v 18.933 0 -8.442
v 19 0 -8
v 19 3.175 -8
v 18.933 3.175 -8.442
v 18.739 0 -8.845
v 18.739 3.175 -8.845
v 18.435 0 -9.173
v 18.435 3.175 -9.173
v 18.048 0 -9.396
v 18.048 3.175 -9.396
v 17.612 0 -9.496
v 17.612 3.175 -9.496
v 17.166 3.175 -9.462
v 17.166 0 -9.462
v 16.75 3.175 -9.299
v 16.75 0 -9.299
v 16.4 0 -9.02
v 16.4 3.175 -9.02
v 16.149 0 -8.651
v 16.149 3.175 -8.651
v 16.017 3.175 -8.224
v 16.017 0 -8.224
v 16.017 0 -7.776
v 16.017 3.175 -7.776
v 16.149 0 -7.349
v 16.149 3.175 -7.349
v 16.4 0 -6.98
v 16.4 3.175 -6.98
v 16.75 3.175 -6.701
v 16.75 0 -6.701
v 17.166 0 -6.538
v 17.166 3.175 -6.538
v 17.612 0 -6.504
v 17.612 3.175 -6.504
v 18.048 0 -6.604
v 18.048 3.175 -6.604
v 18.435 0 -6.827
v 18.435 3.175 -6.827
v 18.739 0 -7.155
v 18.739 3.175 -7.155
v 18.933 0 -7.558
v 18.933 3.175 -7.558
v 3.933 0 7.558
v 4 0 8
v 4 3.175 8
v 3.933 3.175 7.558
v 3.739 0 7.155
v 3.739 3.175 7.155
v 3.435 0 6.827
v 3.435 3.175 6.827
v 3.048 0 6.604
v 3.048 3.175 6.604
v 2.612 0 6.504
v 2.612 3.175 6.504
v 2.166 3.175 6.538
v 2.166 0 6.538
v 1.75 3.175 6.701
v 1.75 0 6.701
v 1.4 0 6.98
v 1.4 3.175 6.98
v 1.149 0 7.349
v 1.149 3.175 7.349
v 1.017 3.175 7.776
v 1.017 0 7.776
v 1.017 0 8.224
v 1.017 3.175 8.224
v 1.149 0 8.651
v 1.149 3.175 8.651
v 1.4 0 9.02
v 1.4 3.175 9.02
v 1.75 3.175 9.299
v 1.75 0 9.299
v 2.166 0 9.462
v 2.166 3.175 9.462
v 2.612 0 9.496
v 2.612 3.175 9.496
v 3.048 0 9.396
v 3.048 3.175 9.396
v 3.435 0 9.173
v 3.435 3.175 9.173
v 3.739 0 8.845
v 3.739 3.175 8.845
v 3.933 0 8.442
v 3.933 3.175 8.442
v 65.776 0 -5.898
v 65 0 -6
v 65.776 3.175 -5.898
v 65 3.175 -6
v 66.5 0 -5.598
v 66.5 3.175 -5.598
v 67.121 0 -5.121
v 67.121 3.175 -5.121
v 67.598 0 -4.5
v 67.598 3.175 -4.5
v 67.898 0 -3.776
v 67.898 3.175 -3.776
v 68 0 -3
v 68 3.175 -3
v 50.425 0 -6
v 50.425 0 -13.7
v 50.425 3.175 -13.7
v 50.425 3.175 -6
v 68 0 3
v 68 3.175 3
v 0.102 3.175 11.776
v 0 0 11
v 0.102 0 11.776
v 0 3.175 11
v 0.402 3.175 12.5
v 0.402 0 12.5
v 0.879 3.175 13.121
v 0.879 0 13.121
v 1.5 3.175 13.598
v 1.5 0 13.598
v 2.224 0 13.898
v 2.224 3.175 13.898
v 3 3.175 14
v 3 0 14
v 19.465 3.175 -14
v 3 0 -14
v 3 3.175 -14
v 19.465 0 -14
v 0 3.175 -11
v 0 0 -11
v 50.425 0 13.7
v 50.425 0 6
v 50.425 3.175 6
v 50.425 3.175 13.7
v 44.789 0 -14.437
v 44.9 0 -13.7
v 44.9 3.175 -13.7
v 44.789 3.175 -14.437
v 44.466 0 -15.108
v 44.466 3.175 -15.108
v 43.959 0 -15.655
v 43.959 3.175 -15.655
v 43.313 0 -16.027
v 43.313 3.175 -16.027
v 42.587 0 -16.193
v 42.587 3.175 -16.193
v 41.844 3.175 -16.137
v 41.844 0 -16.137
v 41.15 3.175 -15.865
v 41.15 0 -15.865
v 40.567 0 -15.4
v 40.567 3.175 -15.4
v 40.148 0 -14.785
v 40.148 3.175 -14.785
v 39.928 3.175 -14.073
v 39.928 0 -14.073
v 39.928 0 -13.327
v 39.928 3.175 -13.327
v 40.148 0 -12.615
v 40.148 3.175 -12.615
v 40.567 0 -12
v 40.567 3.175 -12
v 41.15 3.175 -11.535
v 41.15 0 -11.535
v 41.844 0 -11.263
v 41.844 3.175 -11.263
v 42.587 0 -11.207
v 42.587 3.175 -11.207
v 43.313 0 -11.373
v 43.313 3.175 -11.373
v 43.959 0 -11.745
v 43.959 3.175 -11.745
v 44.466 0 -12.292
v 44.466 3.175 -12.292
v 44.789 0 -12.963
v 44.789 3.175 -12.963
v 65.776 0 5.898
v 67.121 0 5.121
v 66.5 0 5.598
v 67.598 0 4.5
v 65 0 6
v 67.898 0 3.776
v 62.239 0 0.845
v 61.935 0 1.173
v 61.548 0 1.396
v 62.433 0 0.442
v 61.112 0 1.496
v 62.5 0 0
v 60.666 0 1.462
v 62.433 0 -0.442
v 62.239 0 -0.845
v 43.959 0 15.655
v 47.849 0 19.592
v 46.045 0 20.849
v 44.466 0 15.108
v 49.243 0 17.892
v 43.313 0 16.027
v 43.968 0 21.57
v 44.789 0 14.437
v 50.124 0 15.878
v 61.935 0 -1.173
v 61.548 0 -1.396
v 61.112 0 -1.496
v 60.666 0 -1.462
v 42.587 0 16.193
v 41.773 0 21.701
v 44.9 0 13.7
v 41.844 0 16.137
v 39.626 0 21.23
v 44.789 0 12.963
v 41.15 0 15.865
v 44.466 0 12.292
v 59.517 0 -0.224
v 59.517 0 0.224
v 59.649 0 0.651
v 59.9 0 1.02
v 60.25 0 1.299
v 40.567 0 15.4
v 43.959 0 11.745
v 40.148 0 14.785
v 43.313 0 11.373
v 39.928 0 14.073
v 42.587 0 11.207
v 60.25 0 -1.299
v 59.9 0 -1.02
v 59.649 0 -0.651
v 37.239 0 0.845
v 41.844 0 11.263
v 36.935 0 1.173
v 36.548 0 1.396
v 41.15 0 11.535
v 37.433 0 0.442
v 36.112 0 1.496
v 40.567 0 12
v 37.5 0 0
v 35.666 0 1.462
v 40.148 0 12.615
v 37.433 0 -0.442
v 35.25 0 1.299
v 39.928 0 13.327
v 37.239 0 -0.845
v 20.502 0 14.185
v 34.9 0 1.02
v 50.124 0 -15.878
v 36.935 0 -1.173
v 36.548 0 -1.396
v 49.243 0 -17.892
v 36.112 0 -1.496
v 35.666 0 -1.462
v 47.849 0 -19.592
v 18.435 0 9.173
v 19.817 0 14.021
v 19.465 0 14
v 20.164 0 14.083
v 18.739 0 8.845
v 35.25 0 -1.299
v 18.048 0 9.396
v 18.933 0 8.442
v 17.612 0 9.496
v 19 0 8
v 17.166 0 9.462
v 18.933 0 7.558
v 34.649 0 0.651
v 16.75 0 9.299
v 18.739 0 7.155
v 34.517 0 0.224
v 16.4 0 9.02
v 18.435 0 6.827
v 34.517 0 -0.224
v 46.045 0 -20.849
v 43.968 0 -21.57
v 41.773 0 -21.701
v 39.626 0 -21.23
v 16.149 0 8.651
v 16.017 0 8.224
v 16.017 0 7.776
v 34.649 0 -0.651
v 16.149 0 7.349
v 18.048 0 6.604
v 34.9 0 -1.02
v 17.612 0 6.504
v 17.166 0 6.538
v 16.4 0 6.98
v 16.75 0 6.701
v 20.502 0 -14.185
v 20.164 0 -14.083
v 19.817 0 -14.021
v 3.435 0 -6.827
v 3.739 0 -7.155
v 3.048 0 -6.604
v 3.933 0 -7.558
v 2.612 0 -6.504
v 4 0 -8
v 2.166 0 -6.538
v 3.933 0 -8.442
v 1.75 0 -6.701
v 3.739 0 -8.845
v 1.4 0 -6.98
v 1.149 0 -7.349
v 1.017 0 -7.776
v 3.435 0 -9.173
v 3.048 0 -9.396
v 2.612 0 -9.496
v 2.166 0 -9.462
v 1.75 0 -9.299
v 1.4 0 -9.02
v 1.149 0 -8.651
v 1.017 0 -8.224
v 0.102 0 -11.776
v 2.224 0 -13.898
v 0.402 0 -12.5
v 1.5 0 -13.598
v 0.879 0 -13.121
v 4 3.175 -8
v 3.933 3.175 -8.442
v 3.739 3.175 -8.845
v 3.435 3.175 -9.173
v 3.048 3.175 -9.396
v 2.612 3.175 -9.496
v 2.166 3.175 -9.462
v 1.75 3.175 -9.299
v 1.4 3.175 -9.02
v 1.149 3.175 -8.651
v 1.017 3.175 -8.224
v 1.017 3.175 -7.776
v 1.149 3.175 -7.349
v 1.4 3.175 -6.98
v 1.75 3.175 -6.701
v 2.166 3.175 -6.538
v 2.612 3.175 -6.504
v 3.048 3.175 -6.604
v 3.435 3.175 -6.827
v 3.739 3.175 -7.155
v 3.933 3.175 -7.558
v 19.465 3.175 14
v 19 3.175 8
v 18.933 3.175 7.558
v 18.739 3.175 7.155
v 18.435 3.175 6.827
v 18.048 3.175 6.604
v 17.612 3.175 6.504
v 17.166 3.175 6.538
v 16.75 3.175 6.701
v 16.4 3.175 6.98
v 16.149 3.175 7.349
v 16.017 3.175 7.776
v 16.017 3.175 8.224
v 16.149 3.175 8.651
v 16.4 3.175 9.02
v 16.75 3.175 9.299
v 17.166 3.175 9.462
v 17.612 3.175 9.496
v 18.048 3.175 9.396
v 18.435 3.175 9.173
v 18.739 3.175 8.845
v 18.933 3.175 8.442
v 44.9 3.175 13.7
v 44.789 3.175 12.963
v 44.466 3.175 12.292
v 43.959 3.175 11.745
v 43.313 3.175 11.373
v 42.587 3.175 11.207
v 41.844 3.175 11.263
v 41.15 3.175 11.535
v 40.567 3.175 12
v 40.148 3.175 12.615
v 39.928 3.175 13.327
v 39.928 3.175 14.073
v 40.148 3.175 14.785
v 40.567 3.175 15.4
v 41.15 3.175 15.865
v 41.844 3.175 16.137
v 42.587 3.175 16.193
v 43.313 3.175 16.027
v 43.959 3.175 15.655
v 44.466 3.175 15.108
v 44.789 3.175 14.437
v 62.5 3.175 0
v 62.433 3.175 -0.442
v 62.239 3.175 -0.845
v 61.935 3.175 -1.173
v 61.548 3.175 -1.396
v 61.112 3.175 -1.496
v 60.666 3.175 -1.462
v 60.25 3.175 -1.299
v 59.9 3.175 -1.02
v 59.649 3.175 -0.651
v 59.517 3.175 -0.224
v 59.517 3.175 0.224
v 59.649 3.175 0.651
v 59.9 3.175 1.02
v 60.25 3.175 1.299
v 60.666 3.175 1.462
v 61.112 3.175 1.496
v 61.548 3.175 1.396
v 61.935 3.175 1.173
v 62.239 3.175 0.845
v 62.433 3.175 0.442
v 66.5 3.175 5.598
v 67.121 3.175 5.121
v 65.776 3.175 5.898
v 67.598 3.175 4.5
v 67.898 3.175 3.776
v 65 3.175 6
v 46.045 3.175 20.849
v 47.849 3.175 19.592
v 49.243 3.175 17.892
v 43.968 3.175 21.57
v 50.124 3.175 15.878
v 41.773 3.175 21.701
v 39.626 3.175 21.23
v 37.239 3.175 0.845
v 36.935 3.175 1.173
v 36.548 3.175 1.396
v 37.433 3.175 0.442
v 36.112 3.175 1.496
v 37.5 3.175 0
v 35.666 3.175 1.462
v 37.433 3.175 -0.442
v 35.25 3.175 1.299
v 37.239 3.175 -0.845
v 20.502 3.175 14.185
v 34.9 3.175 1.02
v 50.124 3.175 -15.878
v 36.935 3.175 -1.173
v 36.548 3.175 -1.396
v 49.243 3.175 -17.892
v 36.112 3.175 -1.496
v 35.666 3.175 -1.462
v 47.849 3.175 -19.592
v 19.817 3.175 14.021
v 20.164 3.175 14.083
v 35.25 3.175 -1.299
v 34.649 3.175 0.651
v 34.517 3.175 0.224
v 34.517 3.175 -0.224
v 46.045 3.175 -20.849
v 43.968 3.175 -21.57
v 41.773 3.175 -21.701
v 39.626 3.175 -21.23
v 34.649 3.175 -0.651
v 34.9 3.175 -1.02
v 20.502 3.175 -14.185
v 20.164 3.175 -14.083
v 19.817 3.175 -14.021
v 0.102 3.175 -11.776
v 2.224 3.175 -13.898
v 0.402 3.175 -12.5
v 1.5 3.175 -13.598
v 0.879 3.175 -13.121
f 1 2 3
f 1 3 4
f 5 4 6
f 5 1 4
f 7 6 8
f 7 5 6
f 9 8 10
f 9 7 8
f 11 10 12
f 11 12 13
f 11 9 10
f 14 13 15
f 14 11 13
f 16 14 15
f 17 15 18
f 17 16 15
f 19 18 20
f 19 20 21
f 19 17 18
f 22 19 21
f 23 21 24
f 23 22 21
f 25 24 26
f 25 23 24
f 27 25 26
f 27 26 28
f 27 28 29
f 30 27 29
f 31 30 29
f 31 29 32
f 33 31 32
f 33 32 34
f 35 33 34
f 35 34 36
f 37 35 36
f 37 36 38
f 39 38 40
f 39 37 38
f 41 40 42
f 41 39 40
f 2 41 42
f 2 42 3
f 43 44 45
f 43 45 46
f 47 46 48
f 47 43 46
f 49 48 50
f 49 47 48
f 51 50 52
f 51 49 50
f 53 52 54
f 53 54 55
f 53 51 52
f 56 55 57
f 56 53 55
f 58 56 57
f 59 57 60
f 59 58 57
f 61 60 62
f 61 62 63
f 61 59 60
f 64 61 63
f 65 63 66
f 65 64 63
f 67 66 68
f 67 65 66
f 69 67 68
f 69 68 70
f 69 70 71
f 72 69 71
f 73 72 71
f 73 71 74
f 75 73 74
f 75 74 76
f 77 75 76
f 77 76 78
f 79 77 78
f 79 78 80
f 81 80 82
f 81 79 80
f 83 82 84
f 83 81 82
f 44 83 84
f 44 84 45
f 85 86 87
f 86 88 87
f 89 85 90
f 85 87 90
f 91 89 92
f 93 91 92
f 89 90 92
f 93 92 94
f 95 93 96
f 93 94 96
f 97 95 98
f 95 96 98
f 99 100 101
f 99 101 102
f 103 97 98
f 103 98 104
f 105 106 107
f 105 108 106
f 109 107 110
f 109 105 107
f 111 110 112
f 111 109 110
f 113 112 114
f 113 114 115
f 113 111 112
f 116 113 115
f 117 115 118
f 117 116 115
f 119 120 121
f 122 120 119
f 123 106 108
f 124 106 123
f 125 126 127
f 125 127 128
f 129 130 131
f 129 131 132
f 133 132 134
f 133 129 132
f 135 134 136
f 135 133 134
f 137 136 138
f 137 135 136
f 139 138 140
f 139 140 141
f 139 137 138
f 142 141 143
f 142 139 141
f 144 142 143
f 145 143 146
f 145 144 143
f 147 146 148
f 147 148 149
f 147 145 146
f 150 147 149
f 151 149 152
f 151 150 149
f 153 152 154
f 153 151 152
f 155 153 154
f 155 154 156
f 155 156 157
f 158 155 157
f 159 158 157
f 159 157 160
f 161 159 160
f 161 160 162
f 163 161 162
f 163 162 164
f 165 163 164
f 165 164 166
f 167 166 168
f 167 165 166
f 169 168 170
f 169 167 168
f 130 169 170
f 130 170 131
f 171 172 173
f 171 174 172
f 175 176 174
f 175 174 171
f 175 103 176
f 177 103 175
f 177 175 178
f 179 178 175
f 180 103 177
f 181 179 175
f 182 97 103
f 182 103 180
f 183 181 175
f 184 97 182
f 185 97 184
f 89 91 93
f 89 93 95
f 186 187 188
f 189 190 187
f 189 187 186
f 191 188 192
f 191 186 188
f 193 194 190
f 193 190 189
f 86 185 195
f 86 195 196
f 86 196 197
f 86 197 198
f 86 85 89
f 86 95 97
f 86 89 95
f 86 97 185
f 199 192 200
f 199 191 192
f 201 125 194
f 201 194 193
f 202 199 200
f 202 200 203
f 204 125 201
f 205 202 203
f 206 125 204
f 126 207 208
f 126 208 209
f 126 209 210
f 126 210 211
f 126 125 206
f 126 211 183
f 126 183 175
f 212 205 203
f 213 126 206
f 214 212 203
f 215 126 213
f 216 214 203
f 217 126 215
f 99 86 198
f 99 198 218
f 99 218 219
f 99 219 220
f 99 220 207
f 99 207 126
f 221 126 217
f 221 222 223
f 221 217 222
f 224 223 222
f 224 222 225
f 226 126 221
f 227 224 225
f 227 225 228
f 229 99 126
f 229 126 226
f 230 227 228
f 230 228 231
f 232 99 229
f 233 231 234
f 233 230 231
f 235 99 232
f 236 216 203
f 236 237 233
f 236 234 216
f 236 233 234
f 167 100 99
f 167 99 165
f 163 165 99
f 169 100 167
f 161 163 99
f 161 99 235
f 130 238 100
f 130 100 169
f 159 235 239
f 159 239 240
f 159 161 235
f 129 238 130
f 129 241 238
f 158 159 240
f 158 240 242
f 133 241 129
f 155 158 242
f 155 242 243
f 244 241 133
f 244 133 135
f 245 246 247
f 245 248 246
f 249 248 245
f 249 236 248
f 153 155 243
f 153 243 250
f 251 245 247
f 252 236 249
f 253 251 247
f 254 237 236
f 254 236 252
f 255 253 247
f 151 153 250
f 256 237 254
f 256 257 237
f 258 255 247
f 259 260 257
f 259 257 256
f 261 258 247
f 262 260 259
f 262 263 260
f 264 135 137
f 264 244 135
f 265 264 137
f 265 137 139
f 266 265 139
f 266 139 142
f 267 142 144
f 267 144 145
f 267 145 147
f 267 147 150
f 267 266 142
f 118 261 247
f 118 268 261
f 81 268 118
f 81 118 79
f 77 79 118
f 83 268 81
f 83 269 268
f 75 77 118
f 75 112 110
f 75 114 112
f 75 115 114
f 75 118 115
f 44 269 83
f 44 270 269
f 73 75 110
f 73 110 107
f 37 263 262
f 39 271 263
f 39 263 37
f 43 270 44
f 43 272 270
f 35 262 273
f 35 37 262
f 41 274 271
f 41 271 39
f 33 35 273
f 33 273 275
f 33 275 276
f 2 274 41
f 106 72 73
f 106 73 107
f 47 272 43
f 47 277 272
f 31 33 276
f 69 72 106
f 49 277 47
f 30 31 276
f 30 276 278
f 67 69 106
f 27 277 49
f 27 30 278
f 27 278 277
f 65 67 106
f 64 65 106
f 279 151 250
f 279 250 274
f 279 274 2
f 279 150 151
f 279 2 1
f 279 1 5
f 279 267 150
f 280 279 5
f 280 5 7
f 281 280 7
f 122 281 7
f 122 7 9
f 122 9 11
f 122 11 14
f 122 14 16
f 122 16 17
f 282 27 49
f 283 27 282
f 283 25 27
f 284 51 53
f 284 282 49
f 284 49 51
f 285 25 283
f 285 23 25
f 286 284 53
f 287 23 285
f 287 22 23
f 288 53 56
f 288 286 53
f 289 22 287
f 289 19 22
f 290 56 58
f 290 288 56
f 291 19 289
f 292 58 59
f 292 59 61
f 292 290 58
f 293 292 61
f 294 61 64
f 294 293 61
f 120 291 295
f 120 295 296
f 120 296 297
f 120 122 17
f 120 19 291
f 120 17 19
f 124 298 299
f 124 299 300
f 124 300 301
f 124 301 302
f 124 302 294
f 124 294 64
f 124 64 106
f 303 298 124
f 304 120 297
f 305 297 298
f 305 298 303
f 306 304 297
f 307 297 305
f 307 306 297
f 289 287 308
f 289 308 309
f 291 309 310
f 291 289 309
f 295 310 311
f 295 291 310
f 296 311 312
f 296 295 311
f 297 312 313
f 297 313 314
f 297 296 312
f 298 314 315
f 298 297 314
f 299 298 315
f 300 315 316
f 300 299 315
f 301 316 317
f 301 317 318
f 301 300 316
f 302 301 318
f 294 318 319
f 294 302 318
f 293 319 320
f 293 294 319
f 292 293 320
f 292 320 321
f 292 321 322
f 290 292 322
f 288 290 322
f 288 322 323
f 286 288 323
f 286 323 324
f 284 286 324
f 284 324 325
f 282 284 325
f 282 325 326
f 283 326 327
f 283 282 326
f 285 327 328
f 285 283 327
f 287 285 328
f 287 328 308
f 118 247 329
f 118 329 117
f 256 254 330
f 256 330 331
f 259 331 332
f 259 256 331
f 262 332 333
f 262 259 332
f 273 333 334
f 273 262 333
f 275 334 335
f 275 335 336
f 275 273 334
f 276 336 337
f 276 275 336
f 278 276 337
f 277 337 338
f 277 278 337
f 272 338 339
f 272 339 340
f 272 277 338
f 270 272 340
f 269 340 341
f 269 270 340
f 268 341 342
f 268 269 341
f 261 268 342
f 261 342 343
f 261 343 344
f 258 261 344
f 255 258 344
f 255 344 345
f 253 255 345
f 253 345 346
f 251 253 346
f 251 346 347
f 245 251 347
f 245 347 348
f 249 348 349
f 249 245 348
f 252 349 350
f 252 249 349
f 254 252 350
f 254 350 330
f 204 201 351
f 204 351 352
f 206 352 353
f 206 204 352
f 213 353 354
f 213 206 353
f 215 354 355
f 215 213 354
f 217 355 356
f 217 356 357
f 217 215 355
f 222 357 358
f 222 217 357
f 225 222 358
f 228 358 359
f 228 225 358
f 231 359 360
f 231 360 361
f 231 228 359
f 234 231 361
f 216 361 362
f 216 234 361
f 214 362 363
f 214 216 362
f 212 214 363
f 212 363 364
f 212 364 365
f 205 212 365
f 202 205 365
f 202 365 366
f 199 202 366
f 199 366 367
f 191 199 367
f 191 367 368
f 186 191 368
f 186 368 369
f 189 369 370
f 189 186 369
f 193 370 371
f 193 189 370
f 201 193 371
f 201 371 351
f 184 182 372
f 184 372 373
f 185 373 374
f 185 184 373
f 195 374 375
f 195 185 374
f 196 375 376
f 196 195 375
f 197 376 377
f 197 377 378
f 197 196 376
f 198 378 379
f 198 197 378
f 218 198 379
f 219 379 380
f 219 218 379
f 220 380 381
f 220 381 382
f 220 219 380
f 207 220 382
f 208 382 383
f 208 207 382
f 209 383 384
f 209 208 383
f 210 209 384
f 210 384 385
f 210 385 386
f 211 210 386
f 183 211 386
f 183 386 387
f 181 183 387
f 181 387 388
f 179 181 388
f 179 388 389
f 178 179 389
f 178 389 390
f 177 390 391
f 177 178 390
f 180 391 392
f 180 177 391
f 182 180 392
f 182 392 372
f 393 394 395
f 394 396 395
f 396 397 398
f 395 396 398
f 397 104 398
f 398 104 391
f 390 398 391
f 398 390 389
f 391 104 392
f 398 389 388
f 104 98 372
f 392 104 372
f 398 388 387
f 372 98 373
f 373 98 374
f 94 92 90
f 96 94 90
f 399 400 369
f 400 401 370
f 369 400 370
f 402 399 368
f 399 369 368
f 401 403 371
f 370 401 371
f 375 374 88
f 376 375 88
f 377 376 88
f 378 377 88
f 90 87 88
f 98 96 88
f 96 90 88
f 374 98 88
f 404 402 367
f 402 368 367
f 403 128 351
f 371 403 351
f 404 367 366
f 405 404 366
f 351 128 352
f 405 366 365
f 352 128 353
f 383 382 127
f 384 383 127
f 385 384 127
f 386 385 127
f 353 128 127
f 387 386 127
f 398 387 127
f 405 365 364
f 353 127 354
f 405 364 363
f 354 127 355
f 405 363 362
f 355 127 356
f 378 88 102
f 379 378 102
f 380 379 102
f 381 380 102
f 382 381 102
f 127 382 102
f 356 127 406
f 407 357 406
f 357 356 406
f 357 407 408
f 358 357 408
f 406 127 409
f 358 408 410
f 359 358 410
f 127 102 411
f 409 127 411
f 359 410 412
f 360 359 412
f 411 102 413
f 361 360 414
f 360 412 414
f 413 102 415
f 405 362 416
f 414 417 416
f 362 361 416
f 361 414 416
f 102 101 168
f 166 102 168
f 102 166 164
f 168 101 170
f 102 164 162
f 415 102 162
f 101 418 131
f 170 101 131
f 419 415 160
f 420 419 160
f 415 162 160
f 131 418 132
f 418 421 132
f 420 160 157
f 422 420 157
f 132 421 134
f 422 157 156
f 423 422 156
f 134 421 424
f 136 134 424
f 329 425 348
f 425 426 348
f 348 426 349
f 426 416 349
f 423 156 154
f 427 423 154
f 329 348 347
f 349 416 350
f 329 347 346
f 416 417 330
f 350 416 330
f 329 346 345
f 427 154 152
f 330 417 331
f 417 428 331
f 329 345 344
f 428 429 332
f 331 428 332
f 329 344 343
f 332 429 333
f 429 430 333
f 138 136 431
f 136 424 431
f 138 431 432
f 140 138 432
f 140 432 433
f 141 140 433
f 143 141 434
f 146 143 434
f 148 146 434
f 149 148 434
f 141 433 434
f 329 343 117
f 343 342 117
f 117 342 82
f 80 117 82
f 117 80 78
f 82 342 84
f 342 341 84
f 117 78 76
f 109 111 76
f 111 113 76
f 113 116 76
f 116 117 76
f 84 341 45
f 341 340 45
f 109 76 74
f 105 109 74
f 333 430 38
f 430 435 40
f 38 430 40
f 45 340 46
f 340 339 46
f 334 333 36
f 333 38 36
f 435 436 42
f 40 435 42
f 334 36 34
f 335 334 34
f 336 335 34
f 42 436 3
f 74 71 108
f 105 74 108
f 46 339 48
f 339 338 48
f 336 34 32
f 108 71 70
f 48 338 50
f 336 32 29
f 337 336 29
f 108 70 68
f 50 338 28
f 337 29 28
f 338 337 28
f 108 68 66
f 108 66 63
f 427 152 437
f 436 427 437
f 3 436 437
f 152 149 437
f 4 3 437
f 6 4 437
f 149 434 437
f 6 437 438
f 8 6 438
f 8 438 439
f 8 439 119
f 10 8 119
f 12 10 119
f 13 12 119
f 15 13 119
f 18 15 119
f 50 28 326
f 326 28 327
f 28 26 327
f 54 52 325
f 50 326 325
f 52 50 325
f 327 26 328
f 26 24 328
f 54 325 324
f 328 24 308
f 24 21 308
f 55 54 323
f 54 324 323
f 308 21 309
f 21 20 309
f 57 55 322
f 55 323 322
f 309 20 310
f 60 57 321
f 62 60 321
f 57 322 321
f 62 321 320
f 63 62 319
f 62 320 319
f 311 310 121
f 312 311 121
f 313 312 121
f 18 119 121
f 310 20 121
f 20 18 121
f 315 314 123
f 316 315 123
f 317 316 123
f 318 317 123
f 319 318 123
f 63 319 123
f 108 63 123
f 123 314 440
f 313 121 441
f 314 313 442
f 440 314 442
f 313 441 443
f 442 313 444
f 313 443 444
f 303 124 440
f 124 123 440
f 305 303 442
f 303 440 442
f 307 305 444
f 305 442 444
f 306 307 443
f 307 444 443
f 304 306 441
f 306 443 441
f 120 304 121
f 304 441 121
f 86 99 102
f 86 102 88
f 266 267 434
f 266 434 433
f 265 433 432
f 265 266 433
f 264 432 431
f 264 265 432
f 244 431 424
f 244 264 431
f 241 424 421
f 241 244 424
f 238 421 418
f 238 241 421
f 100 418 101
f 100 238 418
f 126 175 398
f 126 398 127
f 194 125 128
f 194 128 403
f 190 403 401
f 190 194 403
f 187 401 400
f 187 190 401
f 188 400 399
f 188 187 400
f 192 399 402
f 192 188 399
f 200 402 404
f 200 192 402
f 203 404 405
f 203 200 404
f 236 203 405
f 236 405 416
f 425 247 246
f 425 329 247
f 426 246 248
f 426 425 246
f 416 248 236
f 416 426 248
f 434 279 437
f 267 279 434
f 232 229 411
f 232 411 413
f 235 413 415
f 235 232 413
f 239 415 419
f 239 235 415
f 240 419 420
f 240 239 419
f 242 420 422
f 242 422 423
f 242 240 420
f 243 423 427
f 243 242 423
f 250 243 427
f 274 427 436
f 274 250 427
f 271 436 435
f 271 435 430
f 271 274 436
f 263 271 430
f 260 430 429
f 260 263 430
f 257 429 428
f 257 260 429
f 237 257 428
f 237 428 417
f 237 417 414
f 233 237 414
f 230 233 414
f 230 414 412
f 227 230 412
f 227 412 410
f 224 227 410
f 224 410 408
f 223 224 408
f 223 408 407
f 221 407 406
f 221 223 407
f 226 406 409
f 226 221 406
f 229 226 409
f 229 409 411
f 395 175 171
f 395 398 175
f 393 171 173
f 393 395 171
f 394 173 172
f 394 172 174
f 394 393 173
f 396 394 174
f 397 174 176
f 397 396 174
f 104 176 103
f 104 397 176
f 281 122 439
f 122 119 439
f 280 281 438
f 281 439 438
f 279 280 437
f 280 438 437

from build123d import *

# Parameters (mm, degrees)
SKETCH1_R           = 1.5
SKETCH1_R_2         = 2.5
BOSS_EXTRUDE1_DEPTH = 3.175
FILLET1_R           = 3


with BuildPart() as part:
    # Sketch1 → Boss-Extrude1 (new body)
    with BuildSketch(Plane(origin=(0, 0, 0), x_dir=(1, 0, 0), z_dir=(0, 1, 0))):
        with BuildLine():
            Line((0, -14), (0, 14))
            Line((0, 14), (20, 14))
            Line((20, 14), (39.625823576, 21.230243699))
            ThreePointArc((39.625823576, 21.230243699), (46.990090369, 20.282681475), (50.425, 13.7))
            Line((50.425, 13.7), (50.425, 6))
            Line((50.425, 6), (68, 6))
            Line((68, 6), (68, -6))
            Line((68, -6), (50.425, -6))
            Line((50.425, -6), (50.425, -13.7))
            ThreePointArc((50.425, -13.7), (46.990090369, -20.282681475), (39.625823576, -21.230243699))
            Line((39.625823576, -21.230243699), (20, -14))
            Line((20, -14), (0, -14))
        make_face()
        with Locations((2.5, 8)):
            Circle(SKETCH1_R, mode=Mode.SUBTRACT)
        with Locations((17.5, 8)):
            Circle(SKETCH1_R, mode=Mode.SUBTRACT)
        with Locations((17.5, -8)):
            Circle(SKETCH1_R, mode=Mode.SUBTRACT)
        with Locations((2.5, -8)):
            Circle(SKETCH1_R, mode=Mode.SUBTRACT)
        with Locations((42.4, 13.7)):
            Circle(SKETCH1_R_2, mode=Mode.SUBTRACT)
        with Locations((42.4, -13.7)):
            Circle(SKETCH1_R_2, mode=Mode.SUBTRACT)
        with Locations((36, 0)):
            Circle(SKETCH1_R, mode=Mode.SUBTRACT)
        with Locations((61, 0)):
            Circle(SKETCH1_R, mode=Mode.SUBTRACT)
    extrude(amount=BOSS_EXTRUDE1_DEPTH)

    # Fillet1
    fillet1_edges = [part.edges().sort_by_distance(p)[0] for p in [
        (0, 1.5875, 14),
        (0, 1.5875, -14),
        (20, 1.5875, -14),
        (68, 1.5875, -6),
        (68, 1.5875, 6),
        (20, 1.5875, 14),
    ]]
    fillet(fillet1_edges, radius=FILLET1_R)


solid = part.part
